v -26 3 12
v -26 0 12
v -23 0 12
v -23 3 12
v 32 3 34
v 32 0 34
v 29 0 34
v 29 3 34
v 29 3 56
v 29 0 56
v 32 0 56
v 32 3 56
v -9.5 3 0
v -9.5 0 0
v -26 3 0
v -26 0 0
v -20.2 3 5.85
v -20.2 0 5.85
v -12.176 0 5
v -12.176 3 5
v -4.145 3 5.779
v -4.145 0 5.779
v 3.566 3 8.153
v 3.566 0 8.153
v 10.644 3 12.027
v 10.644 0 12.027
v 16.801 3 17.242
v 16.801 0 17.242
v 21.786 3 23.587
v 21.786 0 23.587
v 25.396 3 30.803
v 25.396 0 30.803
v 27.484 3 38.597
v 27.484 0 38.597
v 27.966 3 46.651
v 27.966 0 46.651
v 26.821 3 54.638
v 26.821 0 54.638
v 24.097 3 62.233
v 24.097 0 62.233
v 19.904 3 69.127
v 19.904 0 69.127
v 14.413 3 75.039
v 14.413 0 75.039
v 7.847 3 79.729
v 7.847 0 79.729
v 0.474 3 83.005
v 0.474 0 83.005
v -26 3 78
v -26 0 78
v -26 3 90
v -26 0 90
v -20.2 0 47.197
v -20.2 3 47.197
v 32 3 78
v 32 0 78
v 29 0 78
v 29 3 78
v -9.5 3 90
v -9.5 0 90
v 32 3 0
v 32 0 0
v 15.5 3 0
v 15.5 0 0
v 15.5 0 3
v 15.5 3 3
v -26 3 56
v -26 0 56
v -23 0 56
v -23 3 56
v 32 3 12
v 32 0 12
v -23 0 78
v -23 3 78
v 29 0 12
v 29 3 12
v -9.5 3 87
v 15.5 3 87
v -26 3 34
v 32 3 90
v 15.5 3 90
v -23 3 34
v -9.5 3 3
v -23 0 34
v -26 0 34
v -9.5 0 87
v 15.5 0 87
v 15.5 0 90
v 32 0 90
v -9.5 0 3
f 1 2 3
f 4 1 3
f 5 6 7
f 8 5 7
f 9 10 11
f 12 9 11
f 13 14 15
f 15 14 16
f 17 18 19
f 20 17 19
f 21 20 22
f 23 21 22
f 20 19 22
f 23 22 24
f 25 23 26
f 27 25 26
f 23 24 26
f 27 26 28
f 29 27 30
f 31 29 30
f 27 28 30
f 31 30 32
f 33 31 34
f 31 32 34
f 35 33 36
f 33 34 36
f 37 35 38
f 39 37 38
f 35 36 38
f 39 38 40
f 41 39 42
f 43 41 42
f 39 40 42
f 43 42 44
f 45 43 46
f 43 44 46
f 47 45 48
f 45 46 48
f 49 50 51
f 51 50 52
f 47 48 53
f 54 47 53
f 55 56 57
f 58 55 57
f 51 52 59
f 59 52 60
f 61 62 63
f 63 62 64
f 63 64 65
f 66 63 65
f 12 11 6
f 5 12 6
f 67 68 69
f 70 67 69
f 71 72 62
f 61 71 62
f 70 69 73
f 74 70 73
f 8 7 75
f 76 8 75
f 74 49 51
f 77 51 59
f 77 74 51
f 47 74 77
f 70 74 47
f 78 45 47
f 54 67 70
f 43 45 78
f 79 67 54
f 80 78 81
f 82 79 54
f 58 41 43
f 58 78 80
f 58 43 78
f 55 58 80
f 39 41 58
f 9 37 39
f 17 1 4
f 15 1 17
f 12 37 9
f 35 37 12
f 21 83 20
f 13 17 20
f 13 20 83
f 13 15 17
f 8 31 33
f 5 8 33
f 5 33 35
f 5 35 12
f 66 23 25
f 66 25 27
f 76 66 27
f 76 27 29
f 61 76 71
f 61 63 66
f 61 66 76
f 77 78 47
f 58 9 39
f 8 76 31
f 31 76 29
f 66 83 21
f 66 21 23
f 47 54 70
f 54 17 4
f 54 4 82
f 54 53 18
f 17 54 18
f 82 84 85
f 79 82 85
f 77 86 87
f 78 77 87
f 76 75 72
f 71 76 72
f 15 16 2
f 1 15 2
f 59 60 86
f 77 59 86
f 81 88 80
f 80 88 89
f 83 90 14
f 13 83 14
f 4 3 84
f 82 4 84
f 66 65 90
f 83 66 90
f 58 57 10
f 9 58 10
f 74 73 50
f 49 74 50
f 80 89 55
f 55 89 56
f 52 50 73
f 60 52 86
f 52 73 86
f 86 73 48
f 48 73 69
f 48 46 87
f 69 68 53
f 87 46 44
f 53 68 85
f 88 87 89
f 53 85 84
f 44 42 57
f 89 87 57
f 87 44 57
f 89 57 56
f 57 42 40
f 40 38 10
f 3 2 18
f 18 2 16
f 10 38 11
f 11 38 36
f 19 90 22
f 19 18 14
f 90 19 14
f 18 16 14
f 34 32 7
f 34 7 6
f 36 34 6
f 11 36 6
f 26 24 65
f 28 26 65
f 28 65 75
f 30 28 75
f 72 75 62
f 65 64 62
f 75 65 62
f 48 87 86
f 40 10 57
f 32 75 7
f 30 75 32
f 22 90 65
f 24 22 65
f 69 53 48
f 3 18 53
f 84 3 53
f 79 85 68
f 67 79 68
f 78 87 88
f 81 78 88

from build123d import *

# Parameters (mm, degrees)
BOSS_EXTRUDE2_DEPTH = 3


with BuildPart() as part:
    # Sketch4 → Boss-Extrude2 (new body)
    with BuildSketch(Plane(origin=(0, 0, 0), x_dir=(1, 0, 0), z_dir=(0, 1, 0))):
        Polygon((-26, -90), (-9.5, -90), (-9.5, -87), (15.5, -87), (15.5, -90), (32, -90), (32, -78), (29, -78), (29, -56), (32, -56), (32, -34), (29, -34), (29, -12), (32, -12), (32, 0), (15.5, 0), (15.5, -3), (-9.5, -3), (-9.5, 0), (-26, 0), (-26, -12), (-23, -12), (-23, -34), (-26, -34), (-26, -56), (-23, -56), (-23, -78), (-26, -78), align=None)
        with BuildLine():
            Line((-20.2, -47.197183378), (-20.2, -5.849521076))
            ThreePointArc((-20.2, -5.849521076), (26.637033052, -34.647238196), (0.473831151, -83.005309319))
            Line((0.473831151, -83.005309319), (-20.2, -47.197183378))
        make_face(mode=Mode.SUBTRACT)
    extrude(amount=BOSS_EXTRUDE2_DEPTH)


solid = part.part
